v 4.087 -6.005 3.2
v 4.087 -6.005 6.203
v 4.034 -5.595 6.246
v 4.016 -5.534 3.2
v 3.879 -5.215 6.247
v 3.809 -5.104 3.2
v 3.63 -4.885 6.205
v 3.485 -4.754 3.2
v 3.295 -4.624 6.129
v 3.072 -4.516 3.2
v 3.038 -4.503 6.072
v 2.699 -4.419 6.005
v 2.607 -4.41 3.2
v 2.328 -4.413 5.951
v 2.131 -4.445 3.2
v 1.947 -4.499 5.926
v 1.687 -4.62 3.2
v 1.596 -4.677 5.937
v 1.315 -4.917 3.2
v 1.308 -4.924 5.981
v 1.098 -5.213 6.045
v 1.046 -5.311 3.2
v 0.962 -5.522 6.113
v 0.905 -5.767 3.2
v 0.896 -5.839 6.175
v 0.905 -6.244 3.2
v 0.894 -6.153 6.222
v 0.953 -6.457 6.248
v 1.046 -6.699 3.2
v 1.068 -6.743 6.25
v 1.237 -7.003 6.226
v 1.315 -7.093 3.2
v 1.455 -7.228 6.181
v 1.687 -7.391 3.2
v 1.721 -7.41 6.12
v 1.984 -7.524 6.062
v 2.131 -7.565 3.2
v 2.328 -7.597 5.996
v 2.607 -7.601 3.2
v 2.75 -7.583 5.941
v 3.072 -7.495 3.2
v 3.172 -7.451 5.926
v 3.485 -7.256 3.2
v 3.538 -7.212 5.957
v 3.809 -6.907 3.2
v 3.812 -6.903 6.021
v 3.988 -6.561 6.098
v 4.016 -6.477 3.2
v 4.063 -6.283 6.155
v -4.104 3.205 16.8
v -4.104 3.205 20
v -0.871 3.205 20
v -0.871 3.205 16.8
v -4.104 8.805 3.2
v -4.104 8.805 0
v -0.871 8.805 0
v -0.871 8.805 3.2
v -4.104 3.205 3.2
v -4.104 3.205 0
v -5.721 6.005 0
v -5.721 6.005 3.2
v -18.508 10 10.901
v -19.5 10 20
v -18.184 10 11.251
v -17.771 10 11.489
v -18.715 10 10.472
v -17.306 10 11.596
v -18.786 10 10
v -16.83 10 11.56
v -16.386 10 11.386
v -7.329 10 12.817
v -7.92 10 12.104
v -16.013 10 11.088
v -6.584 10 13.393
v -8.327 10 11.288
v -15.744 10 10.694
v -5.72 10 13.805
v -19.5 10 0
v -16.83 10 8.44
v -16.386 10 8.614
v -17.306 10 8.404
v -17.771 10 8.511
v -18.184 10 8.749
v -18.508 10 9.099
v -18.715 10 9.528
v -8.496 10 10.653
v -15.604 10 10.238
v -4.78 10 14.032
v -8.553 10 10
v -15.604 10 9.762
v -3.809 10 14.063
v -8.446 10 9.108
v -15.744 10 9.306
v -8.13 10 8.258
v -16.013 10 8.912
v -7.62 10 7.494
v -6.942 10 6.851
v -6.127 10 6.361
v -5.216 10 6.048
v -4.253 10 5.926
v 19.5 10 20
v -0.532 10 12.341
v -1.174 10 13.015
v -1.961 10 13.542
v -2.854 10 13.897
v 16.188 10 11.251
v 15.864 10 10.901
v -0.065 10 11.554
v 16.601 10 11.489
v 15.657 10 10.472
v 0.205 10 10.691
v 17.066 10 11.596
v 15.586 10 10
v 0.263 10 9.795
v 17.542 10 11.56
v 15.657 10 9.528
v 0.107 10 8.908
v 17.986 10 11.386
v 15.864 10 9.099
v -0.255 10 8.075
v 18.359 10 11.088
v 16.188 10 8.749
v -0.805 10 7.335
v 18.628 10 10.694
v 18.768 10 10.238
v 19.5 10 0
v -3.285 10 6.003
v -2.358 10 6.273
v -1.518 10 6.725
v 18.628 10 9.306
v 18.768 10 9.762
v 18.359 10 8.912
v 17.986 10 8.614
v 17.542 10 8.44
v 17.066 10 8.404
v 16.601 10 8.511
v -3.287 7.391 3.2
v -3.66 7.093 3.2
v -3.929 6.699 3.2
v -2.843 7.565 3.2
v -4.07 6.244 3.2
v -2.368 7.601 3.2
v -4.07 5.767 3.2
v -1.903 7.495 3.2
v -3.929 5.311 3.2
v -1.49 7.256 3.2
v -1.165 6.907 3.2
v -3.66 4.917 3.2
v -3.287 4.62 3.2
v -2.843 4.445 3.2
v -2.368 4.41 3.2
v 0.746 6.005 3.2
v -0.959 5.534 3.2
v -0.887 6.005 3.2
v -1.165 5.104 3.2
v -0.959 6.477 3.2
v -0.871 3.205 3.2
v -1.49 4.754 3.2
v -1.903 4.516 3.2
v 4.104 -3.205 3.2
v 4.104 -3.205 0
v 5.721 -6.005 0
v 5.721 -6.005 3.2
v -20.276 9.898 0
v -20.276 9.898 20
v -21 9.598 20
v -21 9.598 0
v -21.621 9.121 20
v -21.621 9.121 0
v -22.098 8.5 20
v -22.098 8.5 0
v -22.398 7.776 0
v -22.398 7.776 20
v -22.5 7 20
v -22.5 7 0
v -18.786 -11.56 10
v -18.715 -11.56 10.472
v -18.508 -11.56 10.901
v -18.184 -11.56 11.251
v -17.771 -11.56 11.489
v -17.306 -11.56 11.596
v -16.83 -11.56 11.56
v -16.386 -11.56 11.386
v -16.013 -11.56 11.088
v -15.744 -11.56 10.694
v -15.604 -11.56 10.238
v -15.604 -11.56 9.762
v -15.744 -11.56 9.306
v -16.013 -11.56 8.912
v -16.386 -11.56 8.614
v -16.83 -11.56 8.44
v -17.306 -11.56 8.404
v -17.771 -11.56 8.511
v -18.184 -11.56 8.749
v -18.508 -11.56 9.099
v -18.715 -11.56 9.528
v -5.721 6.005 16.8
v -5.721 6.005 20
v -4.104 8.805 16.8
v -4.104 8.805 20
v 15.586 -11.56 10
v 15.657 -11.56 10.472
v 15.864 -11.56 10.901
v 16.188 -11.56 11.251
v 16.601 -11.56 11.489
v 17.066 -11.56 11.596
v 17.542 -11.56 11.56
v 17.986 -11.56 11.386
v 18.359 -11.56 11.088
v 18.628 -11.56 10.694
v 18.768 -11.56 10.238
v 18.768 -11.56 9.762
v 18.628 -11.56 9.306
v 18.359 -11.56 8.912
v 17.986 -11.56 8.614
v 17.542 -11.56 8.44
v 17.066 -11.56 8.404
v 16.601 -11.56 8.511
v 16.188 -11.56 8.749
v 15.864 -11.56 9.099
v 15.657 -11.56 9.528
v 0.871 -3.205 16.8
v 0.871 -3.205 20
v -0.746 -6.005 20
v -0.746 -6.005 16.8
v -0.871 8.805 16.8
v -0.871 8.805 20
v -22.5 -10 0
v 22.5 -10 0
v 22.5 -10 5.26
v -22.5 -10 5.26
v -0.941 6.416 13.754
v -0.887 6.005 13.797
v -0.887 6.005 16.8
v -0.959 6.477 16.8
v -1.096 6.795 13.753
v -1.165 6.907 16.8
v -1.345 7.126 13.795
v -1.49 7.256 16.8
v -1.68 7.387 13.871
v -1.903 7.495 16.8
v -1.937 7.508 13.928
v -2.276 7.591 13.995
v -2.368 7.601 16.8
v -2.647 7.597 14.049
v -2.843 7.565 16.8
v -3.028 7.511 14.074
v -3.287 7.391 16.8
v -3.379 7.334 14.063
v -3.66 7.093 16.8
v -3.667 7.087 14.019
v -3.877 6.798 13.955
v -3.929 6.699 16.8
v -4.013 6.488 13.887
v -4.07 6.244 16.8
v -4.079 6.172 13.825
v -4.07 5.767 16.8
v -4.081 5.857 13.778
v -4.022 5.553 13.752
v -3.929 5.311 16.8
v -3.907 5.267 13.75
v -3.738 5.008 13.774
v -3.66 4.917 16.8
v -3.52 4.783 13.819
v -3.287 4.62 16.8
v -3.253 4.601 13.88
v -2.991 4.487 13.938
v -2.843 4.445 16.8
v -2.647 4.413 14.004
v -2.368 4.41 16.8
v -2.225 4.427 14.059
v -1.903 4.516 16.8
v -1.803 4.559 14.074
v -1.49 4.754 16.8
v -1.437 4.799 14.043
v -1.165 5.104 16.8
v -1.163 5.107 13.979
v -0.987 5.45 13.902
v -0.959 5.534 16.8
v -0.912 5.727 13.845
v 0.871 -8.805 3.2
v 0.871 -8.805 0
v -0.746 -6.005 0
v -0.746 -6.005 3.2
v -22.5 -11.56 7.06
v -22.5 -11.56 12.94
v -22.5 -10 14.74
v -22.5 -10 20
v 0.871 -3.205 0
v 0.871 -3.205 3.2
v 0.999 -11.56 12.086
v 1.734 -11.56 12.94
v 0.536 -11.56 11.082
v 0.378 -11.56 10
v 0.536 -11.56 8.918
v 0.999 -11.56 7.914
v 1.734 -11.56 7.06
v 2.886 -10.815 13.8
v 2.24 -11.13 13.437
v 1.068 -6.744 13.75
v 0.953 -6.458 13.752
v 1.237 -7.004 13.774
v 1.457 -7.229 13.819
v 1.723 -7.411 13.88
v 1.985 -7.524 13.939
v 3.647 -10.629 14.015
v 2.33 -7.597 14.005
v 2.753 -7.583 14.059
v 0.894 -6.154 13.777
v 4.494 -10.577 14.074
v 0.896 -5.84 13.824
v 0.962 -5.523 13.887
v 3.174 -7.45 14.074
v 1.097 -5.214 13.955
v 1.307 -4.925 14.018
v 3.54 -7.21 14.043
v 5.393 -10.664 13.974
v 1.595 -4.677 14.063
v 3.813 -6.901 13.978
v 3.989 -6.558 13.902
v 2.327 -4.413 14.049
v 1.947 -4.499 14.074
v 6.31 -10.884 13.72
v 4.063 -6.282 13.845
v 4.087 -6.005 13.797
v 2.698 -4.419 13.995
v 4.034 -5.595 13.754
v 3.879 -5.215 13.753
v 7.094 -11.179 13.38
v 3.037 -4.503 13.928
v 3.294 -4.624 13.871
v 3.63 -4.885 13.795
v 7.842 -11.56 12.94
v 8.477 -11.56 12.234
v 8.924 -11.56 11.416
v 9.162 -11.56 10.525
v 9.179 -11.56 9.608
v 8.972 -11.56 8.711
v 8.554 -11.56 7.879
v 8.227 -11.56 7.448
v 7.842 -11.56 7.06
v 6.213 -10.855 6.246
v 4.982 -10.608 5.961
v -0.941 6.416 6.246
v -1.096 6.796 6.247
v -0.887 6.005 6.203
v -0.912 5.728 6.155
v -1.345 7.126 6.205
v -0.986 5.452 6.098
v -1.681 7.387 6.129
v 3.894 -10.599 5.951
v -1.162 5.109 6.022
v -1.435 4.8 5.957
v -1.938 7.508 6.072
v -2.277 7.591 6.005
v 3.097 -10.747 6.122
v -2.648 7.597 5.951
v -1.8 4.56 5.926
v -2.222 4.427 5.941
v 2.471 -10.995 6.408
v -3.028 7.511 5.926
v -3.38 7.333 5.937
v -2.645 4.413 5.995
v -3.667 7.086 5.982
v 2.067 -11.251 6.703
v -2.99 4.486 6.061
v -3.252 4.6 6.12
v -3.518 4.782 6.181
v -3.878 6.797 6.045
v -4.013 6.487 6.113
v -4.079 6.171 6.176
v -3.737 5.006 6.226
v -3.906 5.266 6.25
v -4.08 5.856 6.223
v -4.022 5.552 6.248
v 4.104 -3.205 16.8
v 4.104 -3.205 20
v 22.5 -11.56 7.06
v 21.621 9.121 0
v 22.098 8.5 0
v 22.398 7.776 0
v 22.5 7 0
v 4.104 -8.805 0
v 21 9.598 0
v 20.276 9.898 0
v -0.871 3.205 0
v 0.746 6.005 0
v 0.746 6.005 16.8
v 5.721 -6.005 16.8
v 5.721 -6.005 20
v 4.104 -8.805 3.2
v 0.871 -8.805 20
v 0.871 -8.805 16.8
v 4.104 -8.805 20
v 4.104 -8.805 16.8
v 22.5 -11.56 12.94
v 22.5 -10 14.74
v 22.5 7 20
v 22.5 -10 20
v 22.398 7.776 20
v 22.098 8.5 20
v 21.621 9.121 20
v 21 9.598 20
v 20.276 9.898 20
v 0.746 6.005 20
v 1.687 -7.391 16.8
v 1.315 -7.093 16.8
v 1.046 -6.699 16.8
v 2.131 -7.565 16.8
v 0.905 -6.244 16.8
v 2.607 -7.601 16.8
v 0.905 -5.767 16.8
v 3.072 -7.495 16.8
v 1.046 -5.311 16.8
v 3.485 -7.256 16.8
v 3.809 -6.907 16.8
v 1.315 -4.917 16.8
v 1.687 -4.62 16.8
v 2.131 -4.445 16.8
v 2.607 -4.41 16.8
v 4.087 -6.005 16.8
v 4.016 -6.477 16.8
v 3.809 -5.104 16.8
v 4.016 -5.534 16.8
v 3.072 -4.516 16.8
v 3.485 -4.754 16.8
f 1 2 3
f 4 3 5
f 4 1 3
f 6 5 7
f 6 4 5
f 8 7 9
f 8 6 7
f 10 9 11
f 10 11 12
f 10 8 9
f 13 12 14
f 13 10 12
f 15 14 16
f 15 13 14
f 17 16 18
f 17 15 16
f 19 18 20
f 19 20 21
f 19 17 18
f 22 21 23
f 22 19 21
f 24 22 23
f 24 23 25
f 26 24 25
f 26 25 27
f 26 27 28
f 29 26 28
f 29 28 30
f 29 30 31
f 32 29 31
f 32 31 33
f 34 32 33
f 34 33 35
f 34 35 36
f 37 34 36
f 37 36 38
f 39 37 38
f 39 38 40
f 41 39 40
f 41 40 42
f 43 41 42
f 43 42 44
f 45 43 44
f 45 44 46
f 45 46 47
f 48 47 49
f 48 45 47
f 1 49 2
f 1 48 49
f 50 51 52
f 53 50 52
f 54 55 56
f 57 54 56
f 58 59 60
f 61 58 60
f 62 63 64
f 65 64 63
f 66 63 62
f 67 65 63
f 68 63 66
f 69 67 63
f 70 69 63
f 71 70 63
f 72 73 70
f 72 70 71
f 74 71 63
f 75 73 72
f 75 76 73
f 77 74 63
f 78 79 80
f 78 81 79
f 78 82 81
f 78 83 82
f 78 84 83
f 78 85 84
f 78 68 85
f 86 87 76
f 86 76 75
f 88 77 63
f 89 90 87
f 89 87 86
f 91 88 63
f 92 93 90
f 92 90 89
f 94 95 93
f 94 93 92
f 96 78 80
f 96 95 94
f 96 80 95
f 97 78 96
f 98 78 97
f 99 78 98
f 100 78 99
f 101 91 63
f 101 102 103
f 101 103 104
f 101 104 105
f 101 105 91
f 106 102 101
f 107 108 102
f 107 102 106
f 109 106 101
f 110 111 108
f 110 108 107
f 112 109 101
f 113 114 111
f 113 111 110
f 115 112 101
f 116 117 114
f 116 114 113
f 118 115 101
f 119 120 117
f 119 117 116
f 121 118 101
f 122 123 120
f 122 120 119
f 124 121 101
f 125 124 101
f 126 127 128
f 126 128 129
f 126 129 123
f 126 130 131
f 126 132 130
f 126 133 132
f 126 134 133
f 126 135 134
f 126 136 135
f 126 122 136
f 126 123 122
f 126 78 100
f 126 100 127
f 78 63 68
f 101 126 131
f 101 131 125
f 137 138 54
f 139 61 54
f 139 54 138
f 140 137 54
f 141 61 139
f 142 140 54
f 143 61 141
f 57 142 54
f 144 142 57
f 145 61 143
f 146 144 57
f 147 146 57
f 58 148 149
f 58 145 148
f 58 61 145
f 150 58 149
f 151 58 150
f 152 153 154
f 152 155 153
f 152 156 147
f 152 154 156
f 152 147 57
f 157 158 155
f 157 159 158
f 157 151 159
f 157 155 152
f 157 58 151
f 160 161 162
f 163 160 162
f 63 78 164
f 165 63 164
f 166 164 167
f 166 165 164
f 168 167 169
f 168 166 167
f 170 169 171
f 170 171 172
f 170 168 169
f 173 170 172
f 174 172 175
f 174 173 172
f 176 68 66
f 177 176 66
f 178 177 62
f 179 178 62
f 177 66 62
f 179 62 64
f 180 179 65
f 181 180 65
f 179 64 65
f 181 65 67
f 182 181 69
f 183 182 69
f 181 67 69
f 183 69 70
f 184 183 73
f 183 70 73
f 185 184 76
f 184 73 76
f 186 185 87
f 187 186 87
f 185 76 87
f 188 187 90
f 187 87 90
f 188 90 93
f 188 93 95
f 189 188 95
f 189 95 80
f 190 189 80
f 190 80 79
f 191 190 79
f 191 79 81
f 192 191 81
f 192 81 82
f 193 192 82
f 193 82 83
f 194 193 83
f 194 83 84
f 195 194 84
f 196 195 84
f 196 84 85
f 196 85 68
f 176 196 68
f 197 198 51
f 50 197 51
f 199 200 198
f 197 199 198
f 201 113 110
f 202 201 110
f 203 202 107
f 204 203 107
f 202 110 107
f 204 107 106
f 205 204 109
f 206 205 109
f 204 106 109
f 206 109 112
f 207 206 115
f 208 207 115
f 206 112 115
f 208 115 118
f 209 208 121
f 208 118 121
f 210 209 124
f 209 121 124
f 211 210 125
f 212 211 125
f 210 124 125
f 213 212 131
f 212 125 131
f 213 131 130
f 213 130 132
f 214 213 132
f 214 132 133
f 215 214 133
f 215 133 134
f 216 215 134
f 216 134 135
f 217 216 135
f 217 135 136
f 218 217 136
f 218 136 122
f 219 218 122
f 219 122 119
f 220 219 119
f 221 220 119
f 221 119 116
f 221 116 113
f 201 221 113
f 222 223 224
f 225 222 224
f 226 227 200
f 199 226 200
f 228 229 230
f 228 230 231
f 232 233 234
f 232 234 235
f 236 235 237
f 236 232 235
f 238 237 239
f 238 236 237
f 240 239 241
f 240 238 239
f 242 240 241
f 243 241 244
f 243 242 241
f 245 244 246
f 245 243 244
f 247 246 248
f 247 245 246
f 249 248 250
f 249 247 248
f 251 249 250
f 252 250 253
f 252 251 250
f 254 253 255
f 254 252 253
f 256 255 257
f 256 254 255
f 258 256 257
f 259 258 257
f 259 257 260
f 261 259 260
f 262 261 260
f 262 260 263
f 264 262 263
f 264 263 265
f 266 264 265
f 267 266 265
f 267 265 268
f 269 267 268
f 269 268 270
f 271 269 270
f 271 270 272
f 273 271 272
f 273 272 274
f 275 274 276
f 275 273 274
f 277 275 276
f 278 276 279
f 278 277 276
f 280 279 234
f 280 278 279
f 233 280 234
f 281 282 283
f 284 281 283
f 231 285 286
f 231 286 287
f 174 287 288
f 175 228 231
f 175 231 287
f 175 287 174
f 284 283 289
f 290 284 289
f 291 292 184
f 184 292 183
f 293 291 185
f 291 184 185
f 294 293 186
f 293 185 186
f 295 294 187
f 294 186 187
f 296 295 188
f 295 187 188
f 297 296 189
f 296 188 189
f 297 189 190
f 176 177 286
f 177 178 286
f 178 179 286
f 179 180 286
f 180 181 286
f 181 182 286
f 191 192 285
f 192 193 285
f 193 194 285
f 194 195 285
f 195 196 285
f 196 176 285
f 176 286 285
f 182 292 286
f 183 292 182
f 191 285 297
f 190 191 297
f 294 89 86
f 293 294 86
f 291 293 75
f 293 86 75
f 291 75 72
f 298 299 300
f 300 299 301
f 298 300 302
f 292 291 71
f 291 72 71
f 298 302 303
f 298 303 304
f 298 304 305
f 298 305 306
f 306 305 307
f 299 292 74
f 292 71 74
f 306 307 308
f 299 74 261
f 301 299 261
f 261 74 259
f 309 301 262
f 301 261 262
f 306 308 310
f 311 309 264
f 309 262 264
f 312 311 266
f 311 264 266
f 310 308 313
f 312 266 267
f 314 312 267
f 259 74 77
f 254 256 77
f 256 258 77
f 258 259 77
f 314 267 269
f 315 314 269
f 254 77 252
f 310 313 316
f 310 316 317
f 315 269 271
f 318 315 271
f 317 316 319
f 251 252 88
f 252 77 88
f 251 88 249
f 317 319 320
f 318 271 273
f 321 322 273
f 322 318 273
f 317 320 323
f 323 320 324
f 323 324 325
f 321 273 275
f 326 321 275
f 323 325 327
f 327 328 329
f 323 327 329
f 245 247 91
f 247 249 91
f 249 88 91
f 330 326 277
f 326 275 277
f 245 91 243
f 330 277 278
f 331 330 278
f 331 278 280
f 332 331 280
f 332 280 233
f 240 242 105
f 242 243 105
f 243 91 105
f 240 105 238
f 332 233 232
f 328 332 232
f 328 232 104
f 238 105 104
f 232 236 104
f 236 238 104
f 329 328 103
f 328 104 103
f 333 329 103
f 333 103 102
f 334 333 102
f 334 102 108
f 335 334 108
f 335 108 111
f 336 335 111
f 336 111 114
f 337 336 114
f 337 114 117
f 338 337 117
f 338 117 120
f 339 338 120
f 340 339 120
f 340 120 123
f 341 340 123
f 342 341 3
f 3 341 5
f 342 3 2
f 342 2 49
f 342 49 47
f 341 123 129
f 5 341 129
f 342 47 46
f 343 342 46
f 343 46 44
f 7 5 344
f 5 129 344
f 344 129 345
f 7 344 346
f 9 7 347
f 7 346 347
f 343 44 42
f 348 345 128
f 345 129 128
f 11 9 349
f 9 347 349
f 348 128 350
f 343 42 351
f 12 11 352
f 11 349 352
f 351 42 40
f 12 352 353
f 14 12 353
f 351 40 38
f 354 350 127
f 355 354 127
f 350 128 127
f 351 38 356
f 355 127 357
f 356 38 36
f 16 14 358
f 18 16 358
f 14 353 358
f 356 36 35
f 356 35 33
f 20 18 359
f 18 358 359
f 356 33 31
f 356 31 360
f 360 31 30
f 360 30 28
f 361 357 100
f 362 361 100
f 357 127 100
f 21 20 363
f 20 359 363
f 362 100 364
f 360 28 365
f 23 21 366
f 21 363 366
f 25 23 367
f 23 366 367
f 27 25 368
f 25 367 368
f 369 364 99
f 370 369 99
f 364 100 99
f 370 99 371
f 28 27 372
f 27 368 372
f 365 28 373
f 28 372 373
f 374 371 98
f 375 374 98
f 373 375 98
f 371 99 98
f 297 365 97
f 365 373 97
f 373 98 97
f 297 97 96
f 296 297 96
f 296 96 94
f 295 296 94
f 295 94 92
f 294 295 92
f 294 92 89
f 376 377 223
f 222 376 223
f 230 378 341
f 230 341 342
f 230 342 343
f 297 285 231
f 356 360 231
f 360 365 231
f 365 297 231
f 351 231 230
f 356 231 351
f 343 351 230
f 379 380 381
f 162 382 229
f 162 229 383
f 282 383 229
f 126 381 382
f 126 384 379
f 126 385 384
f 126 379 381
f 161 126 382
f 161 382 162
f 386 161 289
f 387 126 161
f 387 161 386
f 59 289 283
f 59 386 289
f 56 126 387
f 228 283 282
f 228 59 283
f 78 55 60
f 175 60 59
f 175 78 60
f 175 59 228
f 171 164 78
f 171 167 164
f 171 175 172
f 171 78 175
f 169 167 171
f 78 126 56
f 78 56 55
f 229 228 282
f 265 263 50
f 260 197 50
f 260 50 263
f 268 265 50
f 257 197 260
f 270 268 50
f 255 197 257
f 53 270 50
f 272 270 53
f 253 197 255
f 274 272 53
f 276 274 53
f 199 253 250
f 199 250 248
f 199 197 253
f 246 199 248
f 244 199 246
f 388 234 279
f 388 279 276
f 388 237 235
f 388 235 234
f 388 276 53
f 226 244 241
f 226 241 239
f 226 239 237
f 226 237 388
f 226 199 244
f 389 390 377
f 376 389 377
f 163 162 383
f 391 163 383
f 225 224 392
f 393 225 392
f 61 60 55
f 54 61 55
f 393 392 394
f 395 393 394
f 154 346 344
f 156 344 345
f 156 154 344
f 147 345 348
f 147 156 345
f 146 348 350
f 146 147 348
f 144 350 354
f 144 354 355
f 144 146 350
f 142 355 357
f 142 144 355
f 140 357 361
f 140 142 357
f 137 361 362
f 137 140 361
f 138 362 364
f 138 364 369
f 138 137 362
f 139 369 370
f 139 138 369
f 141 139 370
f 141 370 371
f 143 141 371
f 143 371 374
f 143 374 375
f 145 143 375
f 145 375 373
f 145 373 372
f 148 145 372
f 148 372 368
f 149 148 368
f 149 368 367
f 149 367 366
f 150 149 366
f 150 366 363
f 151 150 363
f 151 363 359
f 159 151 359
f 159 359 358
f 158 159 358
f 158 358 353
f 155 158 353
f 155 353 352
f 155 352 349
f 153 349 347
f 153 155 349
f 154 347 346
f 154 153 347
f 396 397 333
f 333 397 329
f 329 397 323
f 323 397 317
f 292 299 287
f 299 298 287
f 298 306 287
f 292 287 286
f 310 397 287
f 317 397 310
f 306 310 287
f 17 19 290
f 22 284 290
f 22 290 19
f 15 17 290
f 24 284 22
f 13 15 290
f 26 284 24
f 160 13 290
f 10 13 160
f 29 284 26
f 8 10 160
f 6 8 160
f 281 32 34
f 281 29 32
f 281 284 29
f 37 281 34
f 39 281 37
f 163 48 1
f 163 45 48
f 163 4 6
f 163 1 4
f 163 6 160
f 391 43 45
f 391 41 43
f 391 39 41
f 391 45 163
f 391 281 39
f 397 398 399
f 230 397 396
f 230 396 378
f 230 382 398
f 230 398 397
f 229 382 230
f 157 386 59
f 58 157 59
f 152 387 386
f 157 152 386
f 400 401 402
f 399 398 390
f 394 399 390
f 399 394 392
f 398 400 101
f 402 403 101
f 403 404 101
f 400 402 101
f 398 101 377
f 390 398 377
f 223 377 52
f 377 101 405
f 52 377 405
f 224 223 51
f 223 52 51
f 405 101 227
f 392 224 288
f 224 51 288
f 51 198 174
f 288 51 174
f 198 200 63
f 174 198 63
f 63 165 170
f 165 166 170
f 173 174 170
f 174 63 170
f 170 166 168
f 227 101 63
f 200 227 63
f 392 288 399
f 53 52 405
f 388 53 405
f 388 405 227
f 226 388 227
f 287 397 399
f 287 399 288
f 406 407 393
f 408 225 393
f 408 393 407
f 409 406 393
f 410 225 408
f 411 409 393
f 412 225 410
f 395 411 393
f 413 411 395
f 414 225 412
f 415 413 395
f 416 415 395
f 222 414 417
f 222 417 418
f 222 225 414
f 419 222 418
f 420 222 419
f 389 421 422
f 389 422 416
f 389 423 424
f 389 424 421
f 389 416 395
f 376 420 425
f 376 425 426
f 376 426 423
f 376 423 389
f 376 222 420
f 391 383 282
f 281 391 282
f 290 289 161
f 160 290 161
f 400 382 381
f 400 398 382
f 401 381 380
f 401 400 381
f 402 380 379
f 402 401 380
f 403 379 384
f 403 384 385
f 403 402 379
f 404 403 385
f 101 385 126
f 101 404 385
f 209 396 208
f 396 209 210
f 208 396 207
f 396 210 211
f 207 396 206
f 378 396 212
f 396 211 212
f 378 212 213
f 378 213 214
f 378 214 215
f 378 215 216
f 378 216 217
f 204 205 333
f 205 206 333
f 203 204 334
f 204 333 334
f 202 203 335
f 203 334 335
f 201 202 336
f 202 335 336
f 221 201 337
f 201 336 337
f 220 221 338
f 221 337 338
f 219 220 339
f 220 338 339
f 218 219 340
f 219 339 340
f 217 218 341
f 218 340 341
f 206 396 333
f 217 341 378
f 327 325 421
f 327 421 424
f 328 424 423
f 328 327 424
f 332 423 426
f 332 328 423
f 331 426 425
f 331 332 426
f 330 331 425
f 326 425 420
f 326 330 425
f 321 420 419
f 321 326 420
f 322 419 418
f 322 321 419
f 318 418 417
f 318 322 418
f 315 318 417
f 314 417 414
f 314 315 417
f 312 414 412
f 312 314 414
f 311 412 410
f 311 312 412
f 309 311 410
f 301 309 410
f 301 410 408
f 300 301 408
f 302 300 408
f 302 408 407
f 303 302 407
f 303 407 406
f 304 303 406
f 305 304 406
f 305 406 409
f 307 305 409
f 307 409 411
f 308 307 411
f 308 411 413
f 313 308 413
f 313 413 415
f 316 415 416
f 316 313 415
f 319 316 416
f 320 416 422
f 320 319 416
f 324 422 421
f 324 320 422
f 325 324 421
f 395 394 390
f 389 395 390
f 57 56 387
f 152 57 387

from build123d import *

# Parameters (mm, degrees)
SKETCH_R        = 1.6
PAD_DEPTH       = 20
PAD001_DEPTH    = 45
SKETCH002_R     = 4.075
POCKET_DEPTH    = 31.803267
POCKET001_DEPTH = 20.001
SKETCH004_R     = 1.6
POCKET002_DEPTH = 21.561
FILLET_R        = 3
POCKET003_DEPTH = 3.2
POCKET004_DEPTH = 3.2


with BuildPart() as part:
    # Sketch → Pad (new body)
    with BuildSketch(Plane.XY):
        Polygon((22.5, 10), (22.5, -10), (-22.5, -10), (-22.5, 10), (-8.552884, 10), (-1.023266, 13.11887), (0.268613, 10), align=None)
        with Locations((-2.487442, 6.005217)):
            Circle(SKETCH_R, mode=Mode.SUBTRACT)
        with Locations((2.487442, -6.005217)):
            Circle(SKETCH_R, mode=Mode.SUBTRACT)
    extrude(amount=PAD_DEPTH)

    # Sketch001 (on Face3 of Pad) → Pad001 (join)
    with BuildSketch(Plane(origin=(-22.5, 0, 0), x_dir=(0, -1, 0), z_dir=(-1, 0, 0))):
        Polygon((10, 10), (10, 14.74), (11.56, 12.94), (11.56, 7.06), (10, 5.26), align=None)
    extrude(amount=-PAD001_DEPTH)

    # Sketch002 (on Face14 of Pad001) → Pocket (cut, through all)
    with BuildSketch(Plane(origin=(-4.788075, 11.559435, 0), x_dir=(-0.92388, -0.382683, 0), z_dir=(-0.382683, 0.92388, 0))):
        with Locations((0, 10)):
            Circle(SKETCH002_R)
    extrude(amount=-POCKET_DEPTH, mode=Mode.SUBTRACT)

    # Sketch003 (on Face6 of Pocket) → Pocket001 (cut, through all)
    with BuildSketch(Plane(origin=(0, 0, 0), x_dir=(1, 0, 0), z_dir=(0, 0, -1))):
        Polygon((-8.552884, -10), (-1.023266, -13.11887), (0.268613, -10), align=None)
    extrude(amount=-POCKET001_DEPTH, mode=Mode.SUBTRACT)

    # Sketch004 (on Face2 of Pocket001) → Pocket002 (cut, through all)
    with BuildSketch(Plane(origin=(0, 10, 0), x_dir=(-1, 0, 0), z_dir=(0, 1, 0))):
        with Locations((-17.186, 10)):
            Circle(SKETCH004_R)
        with Locations((17.186, 10)):
            Circle(SKETCH004_R)
    extrude(amount=-POCKET002_DEPTH, mode=Mode.SUBTRACT)

    # Fillet
    fillet_edges = [part.edges().sort_by_distance(p)[0] for p in [
        (-22.5, 10, 10),
        (22.5, 10, 10),
    ]]
    fillet(fillet_edges, radius=FILLET_R)

    # Sketch005 (on Face2 of Fillet) → Pocket003 (cut)
    with BuildSketch(Plane(origin=(0, 0, 0), x_dir=(1, 0, 0), z_dir=(0, 0, -1))):
        Polygon((5.720604, 6.005217), (4.104023, 8.805217), (0.870862, 8.805217), (-0.745719, 6.005217), (0.870862, 3.205217), (4.104023, 3.205217), align=None)
        Polygon((-5.720604, -6.005217), (-4.104023, -8.805217), (-0.870862, -8.805217), (0.745719, -6.005217), (-0.870862, -3.205217), (-4.104023, -3.205217), align=None)
    extrude(amount=-POCKET003_DEPTH, mode=Mode.SUBTRACT)

    # Sketch006 (on Face5 of Pocket003) → Pocket004 (cut)
    with BuildSketch(Plane.XY.offset(20)):
        Polygon((0.745719, 6.005217), (-0.870862, 8.805217), (-4.104023, 8.805217), (-5.720604, 6.005217), (-4.104023, 3.205217), (-0.870862, 3.205217), align=None)
        Polygon((5.720604, -6.005217), (4.104023, -3.205217), (0.870862, -3.205217), (-0.745719, -6.005217), (0.870862, -8.805217), (4.104023, -8.805217), align=None)
    extrude(amount=-POCKET004_DEPTH, mode=Mode.SUBTRACT)


solid = part.part
